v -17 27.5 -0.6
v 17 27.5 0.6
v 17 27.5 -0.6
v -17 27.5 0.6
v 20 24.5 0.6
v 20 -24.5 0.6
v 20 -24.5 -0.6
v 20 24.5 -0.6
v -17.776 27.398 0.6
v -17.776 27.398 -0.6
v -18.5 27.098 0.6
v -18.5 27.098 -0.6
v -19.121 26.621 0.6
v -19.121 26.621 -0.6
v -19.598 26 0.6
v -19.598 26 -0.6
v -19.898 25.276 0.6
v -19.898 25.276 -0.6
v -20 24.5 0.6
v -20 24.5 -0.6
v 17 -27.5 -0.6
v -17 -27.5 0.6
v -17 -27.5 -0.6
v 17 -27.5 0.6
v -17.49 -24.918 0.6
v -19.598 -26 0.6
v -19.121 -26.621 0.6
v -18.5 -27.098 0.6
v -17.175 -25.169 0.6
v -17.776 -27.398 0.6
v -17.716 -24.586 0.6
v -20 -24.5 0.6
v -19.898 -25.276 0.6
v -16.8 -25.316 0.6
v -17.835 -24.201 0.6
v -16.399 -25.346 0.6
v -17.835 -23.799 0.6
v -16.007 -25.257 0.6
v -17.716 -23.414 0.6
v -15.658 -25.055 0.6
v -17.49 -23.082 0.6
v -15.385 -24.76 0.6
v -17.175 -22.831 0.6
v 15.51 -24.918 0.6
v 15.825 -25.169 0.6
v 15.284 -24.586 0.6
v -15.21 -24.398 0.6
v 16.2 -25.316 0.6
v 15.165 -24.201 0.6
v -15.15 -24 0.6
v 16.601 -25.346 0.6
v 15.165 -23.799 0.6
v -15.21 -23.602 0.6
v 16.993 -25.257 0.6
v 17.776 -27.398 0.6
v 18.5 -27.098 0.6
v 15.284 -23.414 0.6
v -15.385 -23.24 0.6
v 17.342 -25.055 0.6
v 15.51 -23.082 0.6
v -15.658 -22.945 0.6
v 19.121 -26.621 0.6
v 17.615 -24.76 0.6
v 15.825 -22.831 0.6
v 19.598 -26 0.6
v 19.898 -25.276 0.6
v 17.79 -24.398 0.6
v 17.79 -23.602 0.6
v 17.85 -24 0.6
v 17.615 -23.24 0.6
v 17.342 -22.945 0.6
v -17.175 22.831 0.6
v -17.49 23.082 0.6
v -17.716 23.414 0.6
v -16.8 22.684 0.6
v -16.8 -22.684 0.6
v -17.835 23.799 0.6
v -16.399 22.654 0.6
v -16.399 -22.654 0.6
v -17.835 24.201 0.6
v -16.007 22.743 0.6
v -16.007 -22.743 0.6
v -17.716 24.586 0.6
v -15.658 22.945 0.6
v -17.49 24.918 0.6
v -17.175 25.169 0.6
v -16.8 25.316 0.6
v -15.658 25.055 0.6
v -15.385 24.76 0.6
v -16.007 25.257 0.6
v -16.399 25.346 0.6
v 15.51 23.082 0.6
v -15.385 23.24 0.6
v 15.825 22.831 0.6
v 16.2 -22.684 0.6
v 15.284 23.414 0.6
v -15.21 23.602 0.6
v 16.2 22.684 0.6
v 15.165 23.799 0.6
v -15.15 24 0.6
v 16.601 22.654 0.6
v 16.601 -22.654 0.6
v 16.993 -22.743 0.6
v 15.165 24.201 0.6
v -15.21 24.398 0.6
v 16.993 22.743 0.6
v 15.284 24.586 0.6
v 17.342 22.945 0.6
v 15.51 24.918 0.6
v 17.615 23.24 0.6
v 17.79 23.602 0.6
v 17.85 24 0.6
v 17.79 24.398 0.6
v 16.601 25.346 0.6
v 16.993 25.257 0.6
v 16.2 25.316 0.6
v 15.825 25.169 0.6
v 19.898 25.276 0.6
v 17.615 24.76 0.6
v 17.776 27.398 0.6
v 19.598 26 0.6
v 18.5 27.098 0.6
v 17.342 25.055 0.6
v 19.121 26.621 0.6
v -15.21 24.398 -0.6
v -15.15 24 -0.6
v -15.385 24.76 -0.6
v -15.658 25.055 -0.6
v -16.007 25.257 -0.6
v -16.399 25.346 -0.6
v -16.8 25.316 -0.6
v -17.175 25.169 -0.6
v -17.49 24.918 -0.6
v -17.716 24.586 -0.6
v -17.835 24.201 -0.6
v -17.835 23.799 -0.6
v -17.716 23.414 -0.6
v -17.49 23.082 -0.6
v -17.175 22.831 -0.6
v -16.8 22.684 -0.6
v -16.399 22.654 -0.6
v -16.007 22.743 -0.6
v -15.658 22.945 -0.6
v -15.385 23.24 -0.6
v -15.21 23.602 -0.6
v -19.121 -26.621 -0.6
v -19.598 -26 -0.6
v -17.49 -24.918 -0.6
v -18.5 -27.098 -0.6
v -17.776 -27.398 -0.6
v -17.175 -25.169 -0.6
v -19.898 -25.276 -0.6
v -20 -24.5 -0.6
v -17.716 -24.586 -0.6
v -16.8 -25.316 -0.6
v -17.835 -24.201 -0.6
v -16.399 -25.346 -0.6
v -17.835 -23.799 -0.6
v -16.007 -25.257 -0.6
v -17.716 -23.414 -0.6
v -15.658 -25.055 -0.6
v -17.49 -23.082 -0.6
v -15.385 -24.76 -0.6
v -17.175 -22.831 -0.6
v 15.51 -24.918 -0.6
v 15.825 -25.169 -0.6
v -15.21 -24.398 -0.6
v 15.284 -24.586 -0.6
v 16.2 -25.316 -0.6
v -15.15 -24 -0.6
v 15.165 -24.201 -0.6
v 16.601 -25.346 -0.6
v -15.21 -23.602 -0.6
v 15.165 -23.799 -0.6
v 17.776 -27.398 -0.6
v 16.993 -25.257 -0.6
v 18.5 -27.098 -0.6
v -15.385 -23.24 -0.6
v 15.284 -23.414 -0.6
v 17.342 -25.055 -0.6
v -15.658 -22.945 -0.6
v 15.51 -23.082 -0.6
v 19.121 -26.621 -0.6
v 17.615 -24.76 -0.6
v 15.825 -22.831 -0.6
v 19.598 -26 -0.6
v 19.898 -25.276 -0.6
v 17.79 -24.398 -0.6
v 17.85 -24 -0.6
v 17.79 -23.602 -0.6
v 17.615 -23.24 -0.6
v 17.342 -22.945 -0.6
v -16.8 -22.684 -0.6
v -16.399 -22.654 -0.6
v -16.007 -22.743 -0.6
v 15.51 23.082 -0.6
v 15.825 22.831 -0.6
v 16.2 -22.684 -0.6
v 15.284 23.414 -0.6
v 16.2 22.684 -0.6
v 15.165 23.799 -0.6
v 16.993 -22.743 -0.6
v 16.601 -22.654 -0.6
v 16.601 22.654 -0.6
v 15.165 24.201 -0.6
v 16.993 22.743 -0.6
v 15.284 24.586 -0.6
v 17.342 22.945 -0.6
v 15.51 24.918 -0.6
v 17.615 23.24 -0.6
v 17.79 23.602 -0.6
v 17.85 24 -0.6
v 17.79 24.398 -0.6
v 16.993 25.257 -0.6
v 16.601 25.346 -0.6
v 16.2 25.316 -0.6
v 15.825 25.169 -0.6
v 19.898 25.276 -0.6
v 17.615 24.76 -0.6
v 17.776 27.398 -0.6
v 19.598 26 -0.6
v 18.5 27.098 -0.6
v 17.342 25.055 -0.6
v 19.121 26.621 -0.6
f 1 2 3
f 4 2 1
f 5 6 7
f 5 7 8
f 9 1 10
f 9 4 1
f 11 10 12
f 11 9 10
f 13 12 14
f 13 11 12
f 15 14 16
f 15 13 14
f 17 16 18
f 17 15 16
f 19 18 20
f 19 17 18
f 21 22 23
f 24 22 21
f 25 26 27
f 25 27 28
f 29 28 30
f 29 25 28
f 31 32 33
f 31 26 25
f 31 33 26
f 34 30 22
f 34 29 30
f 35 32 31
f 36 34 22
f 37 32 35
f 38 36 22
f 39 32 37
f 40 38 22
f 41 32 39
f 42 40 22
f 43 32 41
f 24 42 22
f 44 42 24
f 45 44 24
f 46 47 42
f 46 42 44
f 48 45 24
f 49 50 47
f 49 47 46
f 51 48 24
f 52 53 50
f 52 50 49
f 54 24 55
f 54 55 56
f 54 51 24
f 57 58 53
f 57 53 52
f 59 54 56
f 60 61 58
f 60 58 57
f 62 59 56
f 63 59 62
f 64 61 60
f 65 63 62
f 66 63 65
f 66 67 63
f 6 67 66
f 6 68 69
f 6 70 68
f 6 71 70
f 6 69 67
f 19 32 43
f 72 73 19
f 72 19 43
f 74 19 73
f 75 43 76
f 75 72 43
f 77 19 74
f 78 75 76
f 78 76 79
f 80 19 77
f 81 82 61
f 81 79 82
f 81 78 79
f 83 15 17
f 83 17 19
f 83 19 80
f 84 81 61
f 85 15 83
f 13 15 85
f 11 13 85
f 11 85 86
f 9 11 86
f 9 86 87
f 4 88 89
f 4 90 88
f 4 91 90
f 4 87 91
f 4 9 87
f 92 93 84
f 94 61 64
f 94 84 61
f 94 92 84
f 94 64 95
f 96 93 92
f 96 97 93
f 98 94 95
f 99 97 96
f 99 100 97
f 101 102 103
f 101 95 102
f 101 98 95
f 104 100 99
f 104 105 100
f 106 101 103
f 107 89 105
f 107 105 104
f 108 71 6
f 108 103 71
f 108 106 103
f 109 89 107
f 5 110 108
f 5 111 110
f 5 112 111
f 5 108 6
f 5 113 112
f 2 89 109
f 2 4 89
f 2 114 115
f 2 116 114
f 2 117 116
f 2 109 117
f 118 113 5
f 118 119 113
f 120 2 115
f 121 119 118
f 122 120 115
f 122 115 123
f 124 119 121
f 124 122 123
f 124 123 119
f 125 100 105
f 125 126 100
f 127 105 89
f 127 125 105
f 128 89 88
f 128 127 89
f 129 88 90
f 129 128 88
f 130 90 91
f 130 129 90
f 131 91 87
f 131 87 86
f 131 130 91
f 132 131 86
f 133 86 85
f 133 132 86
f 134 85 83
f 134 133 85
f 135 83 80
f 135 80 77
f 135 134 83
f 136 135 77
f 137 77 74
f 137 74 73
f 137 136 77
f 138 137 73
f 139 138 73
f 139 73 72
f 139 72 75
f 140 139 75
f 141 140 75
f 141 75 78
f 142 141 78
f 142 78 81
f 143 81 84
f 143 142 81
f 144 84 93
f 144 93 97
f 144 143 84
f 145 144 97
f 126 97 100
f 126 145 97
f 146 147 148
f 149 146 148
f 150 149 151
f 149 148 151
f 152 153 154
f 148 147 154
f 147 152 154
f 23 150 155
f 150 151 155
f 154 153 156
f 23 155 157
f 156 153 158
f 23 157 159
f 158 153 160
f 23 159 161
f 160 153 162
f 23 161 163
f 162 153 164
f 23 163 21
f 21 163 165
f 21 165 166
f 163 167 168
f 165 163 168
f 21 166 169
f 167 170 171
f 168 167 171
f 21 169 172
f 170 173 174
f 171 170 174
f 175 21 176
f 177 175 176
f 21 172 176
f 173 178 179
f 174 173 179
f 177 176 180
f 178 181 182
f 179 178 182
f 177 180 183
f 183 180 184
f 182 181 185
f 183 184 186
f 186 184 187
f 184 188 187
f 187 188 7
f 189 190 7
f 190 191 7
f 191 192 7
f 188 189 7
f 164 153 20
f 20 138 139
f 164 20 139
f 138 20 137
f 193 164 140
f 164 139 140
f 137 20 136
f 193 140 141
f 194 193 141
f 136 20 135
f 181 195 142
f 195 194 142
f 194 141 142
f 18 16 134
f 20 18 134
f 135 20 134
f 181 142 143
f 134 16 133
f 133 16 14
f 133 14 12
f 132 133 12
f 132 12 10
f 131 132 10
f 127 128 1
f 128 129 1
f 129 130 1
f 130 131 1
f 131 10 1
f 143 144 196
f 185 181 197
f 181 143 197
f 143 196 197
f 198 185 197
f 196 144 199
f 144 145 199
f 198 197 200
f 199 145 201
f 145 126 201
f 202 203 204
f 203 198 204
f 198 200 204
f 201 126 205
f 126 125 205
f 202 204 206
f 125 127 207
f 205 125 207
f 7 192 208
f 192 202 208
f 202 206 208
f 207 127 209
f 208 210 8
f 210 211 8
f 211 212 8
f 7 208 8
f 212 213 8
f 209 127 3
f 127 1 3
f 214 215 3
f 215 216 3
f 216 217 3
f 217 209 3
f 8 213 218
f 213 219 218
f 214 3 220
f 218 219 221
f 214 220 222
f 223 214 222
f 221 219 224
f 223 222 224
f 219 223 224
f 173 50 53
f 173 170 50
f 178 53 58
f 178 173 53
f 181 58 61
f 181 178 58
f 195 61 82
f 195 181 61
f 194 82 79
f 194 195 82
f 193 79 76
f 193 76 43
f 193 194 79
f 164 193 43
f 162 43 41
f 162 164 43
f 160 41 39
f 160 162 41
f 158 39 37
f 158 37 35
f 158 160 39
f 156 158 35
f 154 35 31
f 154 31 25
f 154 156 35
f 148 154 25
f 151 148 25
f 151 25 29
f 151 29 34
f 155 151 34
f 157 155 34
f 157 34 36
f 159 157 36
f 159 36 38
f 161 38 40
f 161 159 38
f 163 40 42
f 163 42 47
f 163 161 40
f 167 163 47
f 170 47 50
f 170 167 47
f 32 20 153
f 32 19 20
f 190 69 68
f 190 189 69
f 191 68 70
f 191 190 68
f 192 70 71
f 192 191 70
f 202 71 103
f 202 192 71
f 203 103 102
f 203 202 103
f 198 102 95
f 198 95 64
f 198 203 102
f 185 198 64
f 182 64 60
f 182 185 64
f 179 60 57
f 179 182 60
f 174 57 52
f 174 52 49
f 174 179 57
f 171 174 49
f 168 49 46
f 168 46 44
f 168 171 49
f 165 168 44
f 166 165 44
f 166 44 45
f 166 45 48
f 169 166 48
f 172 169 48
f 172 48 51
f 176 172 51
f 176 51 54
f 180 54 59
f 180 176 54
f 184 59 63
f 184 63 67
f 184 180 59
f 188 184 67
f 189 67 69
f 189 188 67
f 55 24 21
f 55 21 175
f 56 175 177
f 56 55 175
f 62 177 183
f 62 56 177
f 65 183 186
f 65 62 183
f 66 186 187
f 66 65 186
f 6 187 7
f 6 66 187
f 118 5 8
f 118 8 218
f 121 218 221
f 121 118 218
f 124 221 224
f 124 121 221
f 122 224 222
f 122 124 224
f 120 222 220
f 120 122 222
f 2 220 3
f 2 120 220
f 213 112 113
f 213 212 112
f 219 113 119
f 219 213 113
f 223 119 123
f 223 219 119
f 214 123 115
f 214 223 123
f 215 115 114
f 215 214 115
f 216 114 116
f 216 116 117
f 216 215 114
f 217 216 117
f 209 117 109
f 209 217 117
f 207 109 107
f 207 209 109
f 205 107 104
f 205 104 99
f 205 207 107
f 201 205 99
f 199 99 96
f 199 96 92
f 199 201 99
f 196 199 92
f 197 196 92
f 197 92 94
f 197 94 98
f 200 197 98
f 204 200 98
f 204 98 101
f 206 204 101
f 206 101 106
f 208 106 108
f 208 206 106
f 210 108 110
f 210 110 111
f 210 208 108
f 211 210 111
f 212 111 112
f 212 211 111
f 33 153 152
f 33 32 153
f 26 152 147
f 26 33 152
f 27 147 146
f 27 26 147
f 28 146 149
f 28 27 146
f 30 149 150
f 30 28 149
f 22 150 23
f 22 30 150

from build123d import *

# Parameters (mm, degrees)
SKETCH1_R           = 1.35
BOSS_EXTRUDE1_DEPTH = 0.6


with BuildPart() as part:
    # Sketch1 → Boss-Extrude1 (new, symmetric)
    with BuildSketch(Plane.XY):
        with BuildLine():
            Line((-17, -27.5), (17, -27.5))
            ThreePointArc((17, -27.5), (19.121320344, -26.621320344), (20, -24.5))
            Line((20, -24.5), (20, 24.5))
            ThreePointArc((20, 24.5), (19.121320344, 26.621320344), (17, 27.5))
            Line((17, 27.5), (-17, 27.5))
            ThreePointArc((-17, 27.5), (-19.121320344, 26.621320344), (-20, 24.5))
            Line((-20, 24.5), (-20, -24.5))
            ThreePointArc((-20, -24.5), (-19.121320344, -26.621320344), (-17, -27.5))
        make_face()
        with Locations((-16.5, 24)):
            Circle(SKETCH1_R, mode=Mode.SUBTRACT)
        with Locations((-16.5, -24)):
            Circle(SKETCH1_R, mode=Mode.SUBTRACT)
        with Locations((16.5, -24)):
            Circle(SKETCH1_R, mode=Mode.SUBTRACT)
        with Locations((16.5, 24)):
            Circle(SKETCH1_R, mode=Mode.SUBTRACT)
    extrude(amount=BOSS_EXTRUDE1_DEPTH, both=True)


solid = part.part
